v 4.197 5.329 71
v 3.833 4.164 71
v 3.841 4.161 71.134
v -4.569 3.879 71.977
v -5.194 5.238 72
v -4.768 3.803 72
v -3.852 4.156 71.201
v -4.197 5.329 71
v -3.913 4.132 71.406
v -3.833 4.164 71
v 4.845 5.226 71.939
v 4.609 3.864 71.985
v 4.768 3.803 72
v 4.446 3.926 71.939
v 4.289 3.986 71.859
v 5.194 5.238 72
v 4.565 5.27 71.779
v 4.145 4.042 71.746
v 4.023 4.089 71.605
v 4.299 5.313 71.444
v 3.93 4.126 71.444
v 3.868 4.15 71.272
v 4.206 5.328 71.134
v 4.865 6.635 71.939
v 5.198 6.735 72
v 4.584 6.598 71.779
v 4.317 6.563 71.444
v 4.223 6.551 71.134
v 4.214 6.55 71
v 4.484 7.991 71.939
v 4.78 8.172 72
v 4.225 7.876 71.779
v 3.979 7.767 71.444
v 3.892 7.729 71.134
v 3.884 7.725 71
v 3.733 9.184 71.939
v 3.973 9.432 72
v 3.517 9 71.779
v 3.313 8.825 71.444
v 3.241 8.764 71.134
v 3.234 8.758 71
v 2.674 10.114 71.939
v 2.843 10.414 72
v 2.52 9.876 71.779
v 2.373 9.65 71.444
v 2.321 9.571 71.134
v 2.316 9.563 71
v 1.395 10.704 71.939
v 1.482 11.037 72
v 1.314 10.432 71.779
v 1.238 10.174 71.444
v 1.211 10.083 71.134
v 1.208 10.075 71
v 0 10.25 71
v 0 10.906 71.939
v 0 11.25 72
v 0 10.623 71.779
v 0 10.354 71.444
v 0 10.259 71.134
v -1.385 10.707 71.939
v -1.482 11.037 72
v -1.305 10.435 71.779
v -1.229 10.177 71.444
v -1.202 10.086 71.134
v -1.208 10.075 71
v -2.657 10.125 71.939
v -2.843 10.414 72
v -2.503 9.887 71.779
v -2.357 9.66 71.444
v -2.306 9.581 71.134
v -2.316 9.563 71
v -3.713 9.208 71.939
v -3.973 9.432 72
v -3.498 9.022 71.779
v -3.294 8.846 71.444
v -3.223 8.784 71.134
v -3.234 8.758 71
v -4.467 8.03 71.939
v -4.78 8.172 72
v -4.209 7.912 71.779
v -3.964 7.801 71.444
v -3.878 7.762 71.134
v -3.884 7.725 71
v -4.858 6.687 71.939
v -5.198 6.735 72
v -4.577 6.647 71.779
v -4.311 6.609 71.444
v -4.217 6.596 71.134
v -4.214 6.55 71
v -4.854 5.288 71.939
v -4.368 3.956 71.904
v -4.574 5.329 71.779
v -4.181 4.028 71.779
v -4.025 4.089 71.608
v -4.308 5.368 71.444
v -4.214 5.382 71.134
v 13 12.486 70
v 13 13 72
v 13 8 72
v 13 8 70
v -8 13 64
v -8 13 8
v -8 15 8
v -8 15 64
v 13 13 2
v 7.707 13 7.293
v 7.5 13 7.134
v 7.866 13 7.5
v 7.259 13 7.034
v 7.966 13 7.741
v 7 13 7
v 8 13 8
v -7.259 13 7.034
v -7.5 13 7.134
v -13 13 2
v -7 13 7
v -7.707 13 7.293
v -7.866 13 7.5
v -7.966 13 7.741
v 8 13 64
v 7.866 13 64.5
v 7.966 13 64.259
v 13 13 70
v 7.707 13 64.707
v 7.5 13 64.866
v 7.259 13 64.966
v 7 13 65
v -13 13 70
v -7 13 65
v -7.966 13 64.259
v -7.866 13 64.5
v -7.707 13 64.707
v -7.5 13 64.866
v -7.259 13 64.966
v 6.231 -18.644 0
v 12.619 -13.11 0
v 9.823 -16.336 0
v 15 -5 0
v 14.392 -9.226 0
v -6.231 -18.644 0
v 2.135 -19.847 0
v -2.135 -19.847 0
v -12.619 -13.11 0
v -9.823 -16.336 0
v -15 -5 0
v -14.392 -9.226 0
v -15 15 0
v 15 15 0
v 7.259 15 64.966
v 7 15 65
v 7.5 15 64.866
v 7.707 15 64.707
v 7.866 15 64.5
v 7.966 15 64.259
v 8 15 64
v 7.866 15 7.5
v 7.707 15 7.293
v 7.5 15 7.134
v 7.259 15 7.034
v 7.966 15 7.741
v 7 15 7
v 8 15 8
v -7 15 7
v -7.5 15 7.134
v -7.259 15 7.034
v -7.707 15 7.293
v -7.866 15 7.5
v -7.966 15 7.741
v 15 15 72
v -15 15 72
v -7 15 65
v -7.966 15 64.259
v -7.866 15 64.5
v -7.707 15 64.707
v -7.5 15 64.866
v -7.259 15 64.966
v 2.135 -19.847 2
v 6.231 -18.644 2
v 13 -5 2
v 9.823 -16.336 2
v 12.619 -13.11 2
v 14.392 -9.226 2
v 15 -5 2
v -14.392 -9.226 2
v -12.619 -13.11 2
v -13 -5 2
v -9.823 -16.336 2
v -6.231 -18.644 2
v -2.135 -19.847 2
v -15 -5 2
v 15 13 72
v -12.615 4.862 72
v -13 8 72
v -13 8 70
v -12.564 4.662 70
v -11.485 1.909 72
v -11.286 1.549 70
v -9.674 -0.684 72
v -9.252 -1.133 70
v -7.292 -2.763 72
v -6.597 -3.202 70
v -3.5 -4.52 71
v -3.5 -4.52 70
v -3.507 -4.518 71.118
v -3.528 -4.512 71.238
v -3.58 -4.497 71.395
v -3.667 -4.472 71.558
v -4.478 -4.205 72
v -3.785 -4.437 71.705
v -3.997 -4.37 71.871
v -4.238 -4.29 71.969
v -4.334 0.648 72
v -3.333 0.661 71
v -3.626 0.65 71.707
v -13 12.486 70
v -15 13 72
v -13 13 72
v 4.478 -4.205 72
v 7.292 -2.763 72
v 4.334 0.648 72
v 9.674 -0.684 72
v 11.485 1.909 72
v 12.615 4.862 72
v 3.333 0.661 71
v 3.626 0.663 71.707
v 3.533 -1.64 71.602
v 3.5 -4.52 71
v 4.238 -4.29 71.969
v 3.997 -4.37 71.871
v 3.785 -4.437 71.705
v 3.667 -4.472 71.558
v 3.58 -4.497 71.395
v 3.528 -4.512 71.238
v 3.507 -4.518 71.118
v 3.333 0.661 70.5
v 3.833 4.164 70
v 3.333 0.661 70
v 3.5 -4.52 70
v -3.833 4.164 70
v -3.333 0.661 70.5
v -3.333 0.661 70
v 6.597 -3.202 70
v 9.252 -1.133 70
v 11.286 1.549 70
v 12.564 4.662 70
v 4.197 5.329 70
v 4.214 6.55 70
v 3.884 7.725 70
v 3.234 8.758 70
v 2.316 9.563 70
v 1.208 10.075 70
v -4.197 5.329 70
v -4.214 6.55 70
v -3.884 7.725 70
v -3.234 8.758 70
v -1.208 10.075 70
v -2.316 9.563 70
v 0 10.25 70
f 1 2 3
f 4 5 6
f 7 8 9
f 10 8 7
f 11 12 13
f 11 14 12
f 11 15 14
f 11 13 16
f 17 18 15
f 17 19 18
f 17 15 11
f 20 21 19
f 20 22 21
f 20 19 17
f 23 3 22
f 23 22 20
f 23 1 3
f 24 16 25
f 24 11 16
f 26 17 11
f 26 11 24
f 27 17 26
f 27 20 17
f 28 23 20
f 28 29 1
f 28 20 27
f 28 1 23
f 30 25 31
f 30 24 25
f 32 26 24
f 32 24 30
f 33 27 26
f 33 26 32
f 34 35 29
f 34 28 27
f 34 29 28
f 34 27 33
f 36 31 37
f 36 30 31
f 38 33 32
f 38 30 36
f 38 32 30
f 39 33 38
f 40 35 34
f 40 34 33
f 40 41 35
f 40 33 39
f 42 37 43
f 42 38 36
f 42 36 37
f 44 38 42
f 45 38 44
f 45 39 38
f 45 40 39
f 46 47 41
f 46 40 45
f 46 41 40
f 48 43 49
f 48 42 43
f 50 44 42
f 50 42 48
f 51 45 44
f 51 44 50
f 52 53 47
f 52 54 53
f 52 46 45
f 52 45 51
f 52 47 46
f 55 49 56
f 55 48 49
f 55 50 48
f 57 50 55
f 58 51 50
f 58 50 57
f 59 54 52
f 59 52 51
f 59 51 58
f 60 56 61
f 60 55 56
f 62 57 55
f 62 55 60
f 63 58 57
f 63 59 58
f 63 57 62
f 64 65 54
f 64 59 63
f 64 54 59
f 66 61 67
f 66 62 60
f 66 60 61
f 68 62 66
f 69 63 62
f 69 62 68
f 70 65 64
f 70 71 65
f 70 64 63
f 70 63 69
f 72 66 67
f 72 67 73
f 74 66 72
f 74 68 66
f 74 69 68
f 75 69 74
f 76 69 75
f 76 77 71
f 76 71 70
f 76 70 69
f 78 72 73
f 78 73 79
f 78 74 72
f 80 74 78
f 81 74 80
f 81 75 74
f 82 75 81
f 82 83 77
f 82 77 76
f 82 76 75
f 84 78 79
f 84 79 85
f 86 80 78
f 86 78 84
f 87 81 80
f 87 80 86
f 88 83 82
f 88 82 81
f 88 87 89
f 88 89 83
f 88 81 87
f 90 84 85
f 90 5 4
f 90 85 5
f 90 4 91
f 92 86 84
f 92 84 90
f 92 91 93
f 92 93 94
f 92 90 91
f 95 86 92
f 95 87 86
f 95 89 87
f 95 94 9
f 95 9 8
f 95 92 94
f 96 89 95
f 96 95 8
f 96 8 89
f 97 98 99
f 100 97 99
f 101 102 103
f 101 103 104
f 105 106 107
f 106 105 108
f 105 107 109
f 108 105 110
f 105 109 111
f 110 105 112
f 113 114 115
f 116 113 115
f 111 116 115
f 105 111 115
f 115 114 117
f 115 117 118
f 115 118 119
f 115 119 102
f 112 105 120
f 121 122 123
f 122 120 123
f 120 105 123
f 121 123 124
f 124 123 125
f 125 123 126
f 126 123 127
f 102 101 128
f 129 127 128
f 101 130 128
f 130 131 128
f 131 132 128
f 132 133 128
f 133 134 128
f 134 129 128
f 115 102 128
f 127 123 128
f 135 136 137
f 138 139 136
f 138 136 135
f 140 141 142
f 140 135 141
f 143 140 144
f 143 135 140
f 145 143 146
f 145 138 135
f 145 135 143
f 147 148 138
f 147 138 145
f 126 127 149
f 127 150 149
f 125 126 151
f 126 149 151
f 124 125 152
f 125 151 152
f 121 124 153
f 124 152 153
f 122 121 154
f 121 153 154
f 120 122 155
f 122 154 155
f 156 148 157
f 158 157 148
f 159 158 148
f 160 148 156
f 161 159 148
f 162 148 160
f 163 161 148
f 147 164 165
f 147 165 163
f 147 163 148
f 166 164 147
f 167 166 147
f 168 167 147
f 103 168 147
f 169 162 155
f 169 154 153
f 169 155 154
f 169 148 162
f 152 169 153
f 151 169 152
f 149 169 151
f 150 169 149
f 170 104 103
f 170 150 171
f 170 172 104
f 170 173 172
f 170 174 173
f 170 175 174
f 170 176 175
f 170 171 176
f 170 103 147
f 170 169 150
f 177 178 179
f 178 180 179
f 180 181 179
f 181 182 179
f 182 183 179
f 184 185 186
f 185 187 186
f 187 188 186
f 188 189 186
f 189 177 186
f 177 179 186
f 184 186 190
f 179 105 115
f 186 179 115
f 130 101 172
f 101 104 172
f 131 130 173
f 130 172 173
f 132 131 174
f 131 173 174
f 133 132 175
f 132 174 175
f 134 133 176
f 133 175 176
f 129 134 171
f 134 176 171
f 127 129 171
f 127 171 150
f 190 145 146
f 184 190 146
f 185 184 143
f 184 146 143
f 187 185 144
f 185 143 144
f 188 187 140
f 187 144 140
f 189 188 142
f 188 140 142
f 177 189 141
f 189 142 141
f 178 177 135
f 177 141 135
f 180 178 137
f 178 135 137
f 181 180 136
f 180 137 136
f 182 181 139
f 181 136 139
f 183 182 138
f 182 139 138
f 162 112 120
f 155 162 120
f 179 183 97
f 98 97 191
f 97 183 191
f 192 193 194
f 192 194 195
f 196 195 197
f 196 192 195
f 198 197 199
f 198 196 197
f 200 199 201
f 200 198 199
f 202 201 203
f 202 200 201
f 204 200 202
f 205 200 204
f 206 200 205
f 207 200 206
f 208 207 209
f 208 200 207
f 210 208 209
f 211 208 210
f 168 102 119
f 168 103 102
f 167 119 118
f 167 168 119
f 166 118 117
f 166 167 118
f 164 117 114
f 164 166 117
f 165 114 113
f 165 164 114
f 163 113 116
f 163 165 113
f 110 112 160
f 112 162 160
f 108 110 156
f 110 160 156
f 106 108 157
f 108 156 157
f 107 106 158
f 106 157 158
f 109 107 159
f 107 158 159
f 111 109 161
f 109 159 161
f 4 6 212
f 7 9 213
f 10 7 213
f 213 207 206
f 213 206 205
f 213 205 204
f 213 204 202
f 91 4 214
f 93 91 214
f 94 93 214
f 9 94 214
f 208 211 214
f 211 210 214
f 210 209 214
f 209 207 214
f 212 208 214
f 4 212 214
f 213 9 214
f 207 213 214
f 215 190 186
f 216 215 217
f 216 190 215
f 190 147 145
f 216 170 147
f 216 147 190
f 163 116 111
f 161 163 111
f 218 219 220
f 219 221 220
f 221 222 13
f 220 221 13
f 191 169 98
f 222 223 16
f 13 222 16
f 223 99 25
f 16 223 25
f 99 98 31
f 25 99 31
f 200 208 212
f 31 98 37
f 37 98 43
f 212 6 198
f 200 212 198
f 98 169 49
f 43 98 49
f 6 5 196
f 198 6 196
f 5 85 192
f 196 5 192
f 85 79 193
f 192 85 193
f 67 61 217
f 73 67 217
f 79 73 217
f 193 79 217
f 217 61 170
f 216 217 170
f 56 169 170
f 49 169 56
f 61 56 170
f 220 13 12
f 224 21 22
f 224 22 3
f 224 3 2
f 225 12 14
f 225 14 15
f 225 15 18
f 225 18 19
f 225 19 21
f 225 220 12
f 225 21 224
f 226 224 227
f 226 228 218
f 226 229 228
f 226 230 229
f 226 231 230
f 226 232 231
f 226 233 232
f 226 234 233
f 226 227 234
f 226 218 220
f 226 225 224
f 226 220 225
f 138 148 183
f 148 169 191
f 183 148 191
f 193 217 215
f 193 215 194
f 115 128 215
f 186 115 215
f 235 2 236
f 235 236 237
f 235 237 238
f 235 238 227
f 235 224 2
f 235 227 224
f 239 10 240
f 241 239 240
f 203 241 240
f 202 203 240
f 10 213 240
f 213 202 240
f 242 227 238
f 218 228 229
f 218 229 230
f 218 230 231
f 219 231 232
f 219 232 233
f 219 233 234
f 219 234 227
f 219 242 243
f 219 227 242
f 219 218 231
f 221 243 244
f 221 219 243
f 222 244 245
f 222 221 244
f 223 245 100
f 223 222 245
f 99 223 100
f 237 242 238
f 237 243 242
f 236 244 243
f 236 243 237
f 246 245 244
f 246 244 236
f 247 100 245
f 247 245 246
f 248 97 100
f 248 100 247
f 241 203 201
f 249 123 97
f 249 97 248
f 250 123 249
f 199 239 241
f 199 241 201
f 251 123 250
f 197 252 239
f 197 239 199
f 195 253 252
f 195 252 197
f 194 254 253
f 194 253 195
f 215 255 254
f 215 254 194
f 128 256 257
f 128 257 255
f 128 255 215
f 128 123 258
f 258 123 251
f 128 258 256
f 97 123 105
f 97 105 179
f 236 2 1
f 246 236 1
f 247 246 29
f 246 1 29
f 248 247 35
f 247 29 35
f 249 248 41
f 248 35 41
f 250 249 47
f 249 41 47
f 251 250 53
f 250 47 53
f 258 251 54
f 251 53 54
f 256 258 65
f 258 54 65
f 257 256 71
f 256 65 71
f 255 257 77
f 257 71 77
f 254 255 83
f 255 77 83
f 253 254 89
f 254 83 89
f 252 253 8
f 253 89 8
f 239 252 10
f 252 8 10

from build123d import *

# Parameters (mm, degrees)
PAD_DEPTH       = 2
SKETCH001_W     = 30
SKETCH001_H     = 70
PAD001_DEPTH    = 2
PAD002_DEPTH    = 2
PAD003_DEPTH    = 2
POCKET_DEPTH    = 2
SKETCH005_W     = 16
SKETCH005_H     = 58
POCKET001_DEPTH = 2
FILLET_R        = 1
FILLET001_R     = 1


with BuildPart() as part:
    # Sketch → Pad (new body)
    with BuildSketch(Plane.XY):
        with BuildLine():
            Line((-15, -5), (-15, 15))
            Line((-15, 15), (15, 15))
            Line((15, 15), (15, -5))
            ThreePointArc((-15, -5), (0, -20), (15, -5))
        make_face()
    extrude(amount=PAD_DEPTH)

    # Sketch001 (on Face2 of Pad) → Pad001 (join)
    with BuildSketch(Plane(origin=(0, 15, 0), x_dir=(-1, 0, 0), z_dir=(0, 1, 0))):
        with Locations((0, 37)):
            Rectangle(SKETCH001_W, SKETCH001_H)
    extrude(amount=-PAD001_DEPTH)

    # Sketch002 (on Face11 of Pad001) → Pad002 (join)
    with BuildSketch(Plane.YZ.offset(15)):
        Polygon((13, 72), (13, 2), (-5, 2), align=None)
    pad002 = extrude(amount=-PAD002_DEPTH)

    # Mirrored: Pad002 across YZ
    add(pad002.mirror(Plane.YZ))

    # Sketch003 (on Face11 of Mirrored) → Pad003 (join)
    with BuildSketch(Plane.XY.offset(72)):
        with BuildLine():
            Line((-13, 13), (13, 13))
            Line((13, 13), (13, 8))
            ThreePointArc((-13, 8), (0, -5), (13, 8))
            Line((-13, 13), (-13, 8))
        make_face()
    extrude(amount=-PAD003_DEPTH)

    # Sketch004 (on Face19 of Pad003) → Pocket (cut)
    with BuildSketch(Plane.XY.offset(72)):
        with BuildLine():
            ThreePointArc((3.832963, 4.164), (0, 10.25), (-3.832963, 4.164))
            add(Edge.make_bspline(
                [(-3.832963, 4.164), (-3, 1.5), (-3.5, -4.519984)],
                knots=[0, 0, 0, 1, 1, 1], degree=2))
            ThreePointArc((-3.5, -4.519984), (0, -5), (3.5, -4.519984))
            add(Edge.make_bspline(
                [(3.832963, 4.164), (3, 1.5), (3.5, -4.519984)],
                knots=[0, 0, 0, 1, 1, 1], degree=2))
        make_face()
    extrude(amount=-POCKET_DEPTH, mode=Mode.SUBTRACT)

    # Sketch005 (on Face17 of Pocket) → Pocket001 (cut)
    with BuildSketch(Plane.XZ.offset(-13)):
        with Locations((0, 36)):
            Rectangle(SKETCH005_W, SKETCH005_H)
    extrude(amount=-POCKET001_DEPTH, mode=Mode.SUBTRACT)

    # Fillet
    fillet_edges = [part.edges().sort_by_distance(p)[0] for p in [
        (-3.31397, -0.158011, 72),
        (0, 10.25, 72),
        (3.31397, -0.158011, 72),
    ]]
    fillet(fillet_edges, radius=FILLET_R)

    # Fillet001
    fillet001_edges = [part.edges().sort_by_distance(p)[0] for p in [
        (-8, 14, 7),
        (8, 14, 7),
        (8, 14, 65),
        (-8, 14, 65),
    ]]
    fillet(fillet001_edges, radius=FILLET001_R)


solid = part.part
